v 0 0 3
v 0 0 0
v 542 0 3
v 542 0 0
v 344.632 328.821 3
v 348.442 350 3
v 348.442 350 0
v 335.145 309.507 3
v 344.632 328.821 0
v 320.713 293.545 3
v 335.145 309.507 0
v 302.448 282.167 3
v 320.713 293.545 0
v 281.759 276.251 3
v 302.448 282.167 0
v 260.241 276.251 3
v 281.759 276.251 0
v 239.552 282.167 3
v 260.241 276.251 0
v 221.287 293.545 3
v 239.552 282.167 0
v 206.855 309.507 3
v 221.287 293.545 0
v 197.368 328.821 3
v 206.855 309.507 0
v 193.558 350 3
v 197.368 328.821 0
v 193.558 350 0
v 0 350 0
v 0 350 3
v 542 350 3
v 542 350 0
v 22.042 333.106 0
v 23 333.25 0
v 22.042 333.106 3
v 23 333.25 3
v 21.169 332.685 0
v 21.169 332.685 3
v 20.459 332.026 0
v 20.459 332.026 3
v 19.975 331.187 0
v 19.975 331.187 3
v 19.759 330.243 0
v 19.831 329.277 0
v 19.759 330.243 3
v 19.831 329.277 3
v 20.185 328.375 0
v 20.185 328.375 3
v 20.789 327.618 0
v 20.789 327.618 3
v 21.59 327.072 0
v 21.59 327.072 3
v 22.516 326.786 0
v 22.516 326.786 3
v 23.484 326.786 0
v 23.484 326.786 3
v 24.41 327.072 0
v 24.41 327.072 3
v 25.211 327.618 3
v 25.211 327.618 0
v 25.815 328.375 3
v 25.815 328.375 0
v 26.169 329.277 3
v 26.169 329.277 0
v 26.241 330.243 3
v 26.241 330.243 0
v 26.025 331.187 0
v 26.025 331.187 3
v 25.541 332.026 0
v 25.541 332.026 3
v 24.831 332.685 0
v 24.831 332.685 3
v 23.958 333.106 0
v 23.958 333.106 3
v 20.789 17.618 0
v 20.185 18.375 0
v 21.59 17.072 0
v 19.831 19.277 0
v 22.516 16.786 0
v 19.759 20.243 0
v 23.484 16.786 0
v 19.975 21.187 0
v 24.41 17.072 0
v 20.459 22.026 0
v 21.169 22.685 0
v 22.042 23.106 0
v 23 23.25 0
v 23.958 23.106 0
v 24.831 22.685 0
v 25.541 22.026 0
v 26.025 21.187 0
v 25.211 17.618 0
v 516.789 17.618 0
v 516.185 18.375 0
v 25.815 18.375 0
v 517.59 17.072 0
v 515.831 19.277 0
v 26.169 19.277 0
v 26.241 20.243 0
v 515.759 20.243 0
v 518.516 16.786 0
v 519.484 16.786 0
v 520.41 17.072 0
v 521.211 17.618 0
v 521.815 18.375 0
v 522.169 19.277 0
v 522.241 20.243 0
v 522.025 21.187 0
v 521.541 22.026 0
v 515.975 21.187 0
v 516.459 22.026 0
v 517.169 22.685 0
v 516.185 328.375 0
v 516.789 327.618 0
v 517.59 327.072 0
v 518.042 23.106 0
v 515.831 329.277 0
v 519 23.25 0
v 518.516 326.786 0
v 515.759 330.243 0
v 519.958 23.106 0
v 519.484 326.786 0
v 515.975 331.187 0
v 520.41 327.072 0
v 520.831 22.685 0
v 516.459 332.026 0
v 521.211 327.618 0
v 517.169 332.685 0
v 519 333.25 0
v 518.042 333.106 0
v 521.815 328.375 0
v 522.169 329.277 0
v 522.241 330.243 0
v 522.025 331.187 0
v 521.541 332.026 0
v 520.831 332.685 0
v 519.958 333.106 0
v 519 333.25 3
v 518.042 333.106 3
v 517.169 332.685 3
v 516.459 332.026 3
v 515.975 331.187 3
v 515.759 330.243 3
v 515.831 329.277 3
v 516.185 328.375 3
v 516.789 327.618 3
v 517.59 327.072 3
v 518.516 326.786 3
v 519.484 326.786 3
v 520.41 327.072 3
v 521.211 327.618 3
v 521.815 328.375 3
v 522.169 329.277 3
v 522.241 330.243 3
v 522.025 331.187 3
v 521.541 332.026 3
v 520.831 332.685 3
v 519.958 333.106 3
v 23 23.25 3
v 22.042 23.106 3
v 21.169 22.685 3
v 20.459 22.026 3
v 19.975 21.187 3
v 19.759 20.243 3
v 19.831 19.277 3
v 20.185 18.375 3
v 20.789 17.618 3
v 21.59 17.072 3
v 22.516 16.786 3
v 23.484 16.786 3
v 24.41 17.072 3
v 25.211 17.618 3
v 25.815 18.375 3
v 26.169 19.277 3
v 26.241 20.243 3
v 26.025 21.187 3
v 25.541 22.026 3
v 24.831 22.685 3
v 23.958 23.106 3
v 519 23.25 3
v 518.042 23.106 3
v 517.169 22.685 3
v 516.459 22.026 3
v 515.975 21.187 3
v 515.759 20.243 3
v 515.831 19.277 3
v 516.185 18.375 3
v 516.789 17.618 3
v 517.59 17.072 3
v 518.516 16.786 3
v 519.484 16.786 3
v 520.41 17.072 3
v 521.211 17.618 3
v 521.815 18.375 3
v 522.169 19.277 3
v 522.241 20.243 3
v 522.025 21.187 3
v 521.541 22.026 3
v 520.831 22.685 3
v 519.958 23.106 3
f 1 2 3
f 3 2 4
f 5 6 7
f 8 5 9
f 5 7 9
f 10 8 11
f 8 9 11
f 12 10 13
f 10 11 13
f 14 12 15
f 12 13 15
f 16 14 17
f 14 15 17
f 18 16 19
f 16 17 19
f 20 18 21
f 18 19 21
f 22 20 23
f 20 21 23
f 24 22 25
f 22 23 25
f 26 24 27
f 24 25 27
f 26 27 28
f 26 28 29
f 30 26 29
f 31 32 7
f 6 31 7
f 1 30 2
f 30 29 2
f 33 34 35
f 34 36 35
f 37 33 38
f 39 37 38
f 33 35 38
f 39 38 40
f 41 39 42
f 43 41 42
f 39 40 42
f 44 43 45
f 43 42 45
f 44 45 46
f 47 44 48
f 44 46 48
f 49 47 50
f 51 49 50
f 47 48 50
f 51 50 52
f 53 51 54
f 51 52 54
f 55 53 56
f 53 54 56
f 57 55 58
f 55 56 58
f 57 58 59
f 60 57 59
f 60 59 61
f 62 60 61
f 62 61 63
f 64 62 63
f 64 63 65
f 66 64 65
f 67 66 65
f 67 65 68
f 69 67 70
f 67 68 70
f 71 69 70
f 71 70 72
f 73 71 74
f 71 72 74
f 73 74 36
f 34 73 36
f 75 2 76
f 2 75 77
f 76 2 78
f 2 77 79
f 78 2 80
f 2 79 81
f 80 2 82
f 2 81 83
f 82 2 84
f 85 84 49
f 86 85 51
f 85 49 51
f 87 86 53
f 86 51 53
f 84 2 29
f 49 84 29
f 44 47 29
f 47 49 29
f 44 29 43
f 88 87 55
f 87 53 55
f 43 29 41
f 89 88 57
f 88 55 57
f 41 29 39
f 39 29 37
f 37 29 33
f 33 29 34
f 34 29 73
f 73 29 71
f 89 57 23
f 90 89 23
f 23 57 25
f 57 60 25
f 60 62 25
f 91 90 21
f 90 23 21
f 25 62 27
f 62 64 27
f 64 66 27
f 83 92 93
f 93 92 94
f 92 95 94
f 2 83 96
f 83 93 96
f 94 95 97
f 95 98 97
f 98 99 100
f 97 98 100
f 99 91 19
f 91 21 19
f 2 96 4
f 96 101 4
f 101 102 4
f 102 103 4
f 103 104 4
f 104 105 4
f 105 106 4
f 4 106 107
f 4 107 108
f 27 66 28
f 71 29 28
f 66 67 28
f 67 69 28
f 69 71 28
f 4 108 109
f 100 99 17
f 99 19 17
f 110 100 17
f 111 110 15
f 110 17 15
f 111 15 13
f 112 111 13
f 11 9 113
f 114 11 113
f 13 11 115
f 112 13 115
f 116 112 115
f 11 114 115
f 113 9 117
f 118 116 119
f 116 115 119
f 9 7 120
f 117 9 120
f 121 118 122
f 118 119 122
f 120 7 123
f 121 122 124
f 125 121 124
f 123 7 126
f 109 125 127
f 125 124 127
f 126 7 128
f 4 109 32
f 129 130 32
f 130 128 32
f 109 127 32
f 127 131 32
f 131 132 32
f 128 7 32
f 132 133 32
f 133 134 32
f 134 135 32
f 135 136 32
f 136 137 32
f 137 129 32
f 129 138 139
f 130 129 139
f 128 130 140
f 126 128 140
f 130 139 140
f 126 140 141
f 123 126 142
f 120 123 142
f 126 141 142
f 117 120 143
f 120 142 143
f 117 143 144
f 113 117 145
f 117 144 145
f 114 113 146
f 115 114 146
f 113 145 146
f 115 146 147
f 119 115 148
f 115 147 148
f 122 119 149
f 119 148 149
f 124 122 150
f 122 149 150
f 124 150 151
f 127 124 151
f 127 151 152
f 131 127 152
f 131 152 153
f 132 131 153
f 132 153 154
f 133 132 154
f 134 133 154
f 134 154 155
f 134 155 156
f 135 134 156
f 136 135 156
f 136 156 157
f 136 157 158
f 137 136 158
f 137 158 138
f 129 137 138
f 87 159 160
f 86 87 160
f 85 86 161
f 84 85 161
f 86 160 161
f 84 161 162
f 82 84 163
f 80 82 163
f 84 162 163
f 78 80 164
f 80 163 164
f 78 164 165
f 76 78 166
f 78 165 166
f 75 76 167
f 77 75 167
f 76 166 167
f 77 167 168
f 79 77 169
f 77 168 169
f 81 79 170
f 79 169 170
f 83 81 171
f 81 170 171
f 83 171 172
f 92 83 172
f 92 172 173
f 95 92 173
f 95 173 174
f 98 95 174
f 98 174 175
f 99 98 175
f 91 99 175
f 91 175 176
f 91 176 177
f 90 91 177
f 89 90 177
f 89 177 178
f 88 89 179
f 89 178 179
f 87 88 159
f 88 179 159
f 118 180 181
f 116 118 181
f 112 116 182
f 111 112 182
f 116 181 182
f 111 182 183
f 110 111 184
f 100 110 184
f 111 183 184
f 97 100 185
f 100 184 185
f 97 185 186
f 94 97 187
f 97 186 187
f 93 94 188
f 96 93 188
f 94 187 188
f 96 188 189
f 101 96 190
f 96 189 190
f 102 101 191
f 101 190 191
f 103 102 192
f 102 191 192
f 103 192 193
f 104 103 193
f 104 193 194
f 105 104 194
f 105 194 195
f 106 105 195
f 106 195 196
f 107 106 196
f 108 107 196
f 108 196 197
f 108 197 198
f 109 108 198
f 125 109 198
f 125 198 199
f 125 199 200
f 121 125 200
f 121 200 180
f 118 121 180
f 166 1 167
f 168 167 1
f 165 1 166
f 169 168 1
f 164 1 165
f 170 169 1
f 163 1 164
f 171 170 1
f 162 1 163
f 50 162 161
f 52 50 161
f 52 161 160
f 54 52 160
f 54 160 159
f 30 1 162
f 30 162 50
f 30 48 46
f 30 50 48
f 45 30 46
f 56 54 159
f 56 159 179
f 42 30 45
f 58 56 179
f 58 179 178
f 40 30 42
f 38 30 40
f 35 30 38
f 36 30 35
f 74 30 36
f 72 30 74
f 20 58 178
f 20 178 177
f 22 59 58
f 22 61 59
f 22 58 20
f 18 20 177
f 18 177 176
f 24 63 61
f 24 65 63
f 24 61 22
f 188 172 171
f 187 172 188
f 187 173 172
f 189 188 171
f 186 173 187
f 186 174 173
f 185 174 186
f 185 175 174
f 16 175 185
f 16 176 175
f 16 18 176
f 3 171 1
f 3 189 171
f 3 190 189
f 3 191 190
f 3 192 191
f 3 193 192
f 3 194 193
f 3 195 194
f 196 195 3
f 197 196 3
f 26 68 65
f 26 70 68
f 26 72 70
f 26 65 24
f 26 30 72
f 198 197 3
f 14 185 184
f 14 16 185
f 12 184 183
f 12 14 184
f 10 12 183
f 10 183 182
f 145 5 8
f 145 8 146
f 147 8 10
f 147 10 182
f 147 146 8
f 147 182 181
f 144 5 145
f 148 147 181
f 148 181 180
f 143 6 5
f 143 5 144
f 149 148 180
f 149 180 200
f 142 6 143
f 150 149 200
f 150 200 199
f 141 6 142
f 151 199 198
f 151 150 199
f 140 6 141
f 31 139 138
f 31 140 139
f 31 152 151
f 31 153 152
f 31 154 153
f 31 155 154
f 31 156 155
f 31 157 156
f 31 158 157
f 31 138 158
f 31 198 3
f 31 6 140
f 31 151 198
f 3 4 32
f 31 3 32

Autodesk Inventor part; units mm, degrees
ref_plane "YZ Plane" through (0, 0, 0) normal (1, 0, 0) x (0, 1, 0)
ref_plane "XZ Plane" through (0, 0, 0) normal (0, 1, 0) x (-1, 0, 0)
ref_plane "XY Plane" through (0, 0, 0) normal (0, 0, 1) x (1, 0, 0)
sketch "Sketch1" plane through (0, 0, 0) normal (0, 0, 1) x (1, 0, 0)
  line L0 (0, 0) -> (542, 0)
  line L1 (542, 0) -> (542, 350)
  line L2 (0, 350) -> (0, 0)
  line L3 (271, 0) -> (271, 353)
  arc A0 (193.5581, 350) -> (348.4419, 350) centre (271, 353) ccw
  line L4 (542, 350) -> (348.4419, 350)
  line L5 (193.5581, 350) -> (0, 350)
  dimension "d0" = 542
  dimension "d1" = 350
  dimension "d24" = 155
  dimension "d25" = 353
extrude "Extrusion1" add sketch "Sketch1" along normal blind 3
sketch "Sketch2" plane through (0, 0, 0) normal (0, 0, -1) x (-1, 0, 0)
  line L0 (0, 350) -> (0, 0) projected
  line L1 (-542, 0) -> (-542, 350) projected
  line L2 (-542, 350) -> (0, 350) projected
  point P0 (-23, 330)
  point P1 (-23, 20)
  point P2 (-519, 330)
  point P3 (-519, 20)
  dimension "d4" = 23
  dimension "d13" = 20
  dimension "d14" = 350
  dimension "d15" = 542
  dimension "d18" = 310
  dimension "d21" = 496
hole "Hole1" at (23, 330, 0) at (519, 330, 0) at (519, 20, 0) at (23, 20, 0) direction (0, 0, 1) diameter 6.5 end through all
properties part number "plate_top_02" material "Polystyrene"
